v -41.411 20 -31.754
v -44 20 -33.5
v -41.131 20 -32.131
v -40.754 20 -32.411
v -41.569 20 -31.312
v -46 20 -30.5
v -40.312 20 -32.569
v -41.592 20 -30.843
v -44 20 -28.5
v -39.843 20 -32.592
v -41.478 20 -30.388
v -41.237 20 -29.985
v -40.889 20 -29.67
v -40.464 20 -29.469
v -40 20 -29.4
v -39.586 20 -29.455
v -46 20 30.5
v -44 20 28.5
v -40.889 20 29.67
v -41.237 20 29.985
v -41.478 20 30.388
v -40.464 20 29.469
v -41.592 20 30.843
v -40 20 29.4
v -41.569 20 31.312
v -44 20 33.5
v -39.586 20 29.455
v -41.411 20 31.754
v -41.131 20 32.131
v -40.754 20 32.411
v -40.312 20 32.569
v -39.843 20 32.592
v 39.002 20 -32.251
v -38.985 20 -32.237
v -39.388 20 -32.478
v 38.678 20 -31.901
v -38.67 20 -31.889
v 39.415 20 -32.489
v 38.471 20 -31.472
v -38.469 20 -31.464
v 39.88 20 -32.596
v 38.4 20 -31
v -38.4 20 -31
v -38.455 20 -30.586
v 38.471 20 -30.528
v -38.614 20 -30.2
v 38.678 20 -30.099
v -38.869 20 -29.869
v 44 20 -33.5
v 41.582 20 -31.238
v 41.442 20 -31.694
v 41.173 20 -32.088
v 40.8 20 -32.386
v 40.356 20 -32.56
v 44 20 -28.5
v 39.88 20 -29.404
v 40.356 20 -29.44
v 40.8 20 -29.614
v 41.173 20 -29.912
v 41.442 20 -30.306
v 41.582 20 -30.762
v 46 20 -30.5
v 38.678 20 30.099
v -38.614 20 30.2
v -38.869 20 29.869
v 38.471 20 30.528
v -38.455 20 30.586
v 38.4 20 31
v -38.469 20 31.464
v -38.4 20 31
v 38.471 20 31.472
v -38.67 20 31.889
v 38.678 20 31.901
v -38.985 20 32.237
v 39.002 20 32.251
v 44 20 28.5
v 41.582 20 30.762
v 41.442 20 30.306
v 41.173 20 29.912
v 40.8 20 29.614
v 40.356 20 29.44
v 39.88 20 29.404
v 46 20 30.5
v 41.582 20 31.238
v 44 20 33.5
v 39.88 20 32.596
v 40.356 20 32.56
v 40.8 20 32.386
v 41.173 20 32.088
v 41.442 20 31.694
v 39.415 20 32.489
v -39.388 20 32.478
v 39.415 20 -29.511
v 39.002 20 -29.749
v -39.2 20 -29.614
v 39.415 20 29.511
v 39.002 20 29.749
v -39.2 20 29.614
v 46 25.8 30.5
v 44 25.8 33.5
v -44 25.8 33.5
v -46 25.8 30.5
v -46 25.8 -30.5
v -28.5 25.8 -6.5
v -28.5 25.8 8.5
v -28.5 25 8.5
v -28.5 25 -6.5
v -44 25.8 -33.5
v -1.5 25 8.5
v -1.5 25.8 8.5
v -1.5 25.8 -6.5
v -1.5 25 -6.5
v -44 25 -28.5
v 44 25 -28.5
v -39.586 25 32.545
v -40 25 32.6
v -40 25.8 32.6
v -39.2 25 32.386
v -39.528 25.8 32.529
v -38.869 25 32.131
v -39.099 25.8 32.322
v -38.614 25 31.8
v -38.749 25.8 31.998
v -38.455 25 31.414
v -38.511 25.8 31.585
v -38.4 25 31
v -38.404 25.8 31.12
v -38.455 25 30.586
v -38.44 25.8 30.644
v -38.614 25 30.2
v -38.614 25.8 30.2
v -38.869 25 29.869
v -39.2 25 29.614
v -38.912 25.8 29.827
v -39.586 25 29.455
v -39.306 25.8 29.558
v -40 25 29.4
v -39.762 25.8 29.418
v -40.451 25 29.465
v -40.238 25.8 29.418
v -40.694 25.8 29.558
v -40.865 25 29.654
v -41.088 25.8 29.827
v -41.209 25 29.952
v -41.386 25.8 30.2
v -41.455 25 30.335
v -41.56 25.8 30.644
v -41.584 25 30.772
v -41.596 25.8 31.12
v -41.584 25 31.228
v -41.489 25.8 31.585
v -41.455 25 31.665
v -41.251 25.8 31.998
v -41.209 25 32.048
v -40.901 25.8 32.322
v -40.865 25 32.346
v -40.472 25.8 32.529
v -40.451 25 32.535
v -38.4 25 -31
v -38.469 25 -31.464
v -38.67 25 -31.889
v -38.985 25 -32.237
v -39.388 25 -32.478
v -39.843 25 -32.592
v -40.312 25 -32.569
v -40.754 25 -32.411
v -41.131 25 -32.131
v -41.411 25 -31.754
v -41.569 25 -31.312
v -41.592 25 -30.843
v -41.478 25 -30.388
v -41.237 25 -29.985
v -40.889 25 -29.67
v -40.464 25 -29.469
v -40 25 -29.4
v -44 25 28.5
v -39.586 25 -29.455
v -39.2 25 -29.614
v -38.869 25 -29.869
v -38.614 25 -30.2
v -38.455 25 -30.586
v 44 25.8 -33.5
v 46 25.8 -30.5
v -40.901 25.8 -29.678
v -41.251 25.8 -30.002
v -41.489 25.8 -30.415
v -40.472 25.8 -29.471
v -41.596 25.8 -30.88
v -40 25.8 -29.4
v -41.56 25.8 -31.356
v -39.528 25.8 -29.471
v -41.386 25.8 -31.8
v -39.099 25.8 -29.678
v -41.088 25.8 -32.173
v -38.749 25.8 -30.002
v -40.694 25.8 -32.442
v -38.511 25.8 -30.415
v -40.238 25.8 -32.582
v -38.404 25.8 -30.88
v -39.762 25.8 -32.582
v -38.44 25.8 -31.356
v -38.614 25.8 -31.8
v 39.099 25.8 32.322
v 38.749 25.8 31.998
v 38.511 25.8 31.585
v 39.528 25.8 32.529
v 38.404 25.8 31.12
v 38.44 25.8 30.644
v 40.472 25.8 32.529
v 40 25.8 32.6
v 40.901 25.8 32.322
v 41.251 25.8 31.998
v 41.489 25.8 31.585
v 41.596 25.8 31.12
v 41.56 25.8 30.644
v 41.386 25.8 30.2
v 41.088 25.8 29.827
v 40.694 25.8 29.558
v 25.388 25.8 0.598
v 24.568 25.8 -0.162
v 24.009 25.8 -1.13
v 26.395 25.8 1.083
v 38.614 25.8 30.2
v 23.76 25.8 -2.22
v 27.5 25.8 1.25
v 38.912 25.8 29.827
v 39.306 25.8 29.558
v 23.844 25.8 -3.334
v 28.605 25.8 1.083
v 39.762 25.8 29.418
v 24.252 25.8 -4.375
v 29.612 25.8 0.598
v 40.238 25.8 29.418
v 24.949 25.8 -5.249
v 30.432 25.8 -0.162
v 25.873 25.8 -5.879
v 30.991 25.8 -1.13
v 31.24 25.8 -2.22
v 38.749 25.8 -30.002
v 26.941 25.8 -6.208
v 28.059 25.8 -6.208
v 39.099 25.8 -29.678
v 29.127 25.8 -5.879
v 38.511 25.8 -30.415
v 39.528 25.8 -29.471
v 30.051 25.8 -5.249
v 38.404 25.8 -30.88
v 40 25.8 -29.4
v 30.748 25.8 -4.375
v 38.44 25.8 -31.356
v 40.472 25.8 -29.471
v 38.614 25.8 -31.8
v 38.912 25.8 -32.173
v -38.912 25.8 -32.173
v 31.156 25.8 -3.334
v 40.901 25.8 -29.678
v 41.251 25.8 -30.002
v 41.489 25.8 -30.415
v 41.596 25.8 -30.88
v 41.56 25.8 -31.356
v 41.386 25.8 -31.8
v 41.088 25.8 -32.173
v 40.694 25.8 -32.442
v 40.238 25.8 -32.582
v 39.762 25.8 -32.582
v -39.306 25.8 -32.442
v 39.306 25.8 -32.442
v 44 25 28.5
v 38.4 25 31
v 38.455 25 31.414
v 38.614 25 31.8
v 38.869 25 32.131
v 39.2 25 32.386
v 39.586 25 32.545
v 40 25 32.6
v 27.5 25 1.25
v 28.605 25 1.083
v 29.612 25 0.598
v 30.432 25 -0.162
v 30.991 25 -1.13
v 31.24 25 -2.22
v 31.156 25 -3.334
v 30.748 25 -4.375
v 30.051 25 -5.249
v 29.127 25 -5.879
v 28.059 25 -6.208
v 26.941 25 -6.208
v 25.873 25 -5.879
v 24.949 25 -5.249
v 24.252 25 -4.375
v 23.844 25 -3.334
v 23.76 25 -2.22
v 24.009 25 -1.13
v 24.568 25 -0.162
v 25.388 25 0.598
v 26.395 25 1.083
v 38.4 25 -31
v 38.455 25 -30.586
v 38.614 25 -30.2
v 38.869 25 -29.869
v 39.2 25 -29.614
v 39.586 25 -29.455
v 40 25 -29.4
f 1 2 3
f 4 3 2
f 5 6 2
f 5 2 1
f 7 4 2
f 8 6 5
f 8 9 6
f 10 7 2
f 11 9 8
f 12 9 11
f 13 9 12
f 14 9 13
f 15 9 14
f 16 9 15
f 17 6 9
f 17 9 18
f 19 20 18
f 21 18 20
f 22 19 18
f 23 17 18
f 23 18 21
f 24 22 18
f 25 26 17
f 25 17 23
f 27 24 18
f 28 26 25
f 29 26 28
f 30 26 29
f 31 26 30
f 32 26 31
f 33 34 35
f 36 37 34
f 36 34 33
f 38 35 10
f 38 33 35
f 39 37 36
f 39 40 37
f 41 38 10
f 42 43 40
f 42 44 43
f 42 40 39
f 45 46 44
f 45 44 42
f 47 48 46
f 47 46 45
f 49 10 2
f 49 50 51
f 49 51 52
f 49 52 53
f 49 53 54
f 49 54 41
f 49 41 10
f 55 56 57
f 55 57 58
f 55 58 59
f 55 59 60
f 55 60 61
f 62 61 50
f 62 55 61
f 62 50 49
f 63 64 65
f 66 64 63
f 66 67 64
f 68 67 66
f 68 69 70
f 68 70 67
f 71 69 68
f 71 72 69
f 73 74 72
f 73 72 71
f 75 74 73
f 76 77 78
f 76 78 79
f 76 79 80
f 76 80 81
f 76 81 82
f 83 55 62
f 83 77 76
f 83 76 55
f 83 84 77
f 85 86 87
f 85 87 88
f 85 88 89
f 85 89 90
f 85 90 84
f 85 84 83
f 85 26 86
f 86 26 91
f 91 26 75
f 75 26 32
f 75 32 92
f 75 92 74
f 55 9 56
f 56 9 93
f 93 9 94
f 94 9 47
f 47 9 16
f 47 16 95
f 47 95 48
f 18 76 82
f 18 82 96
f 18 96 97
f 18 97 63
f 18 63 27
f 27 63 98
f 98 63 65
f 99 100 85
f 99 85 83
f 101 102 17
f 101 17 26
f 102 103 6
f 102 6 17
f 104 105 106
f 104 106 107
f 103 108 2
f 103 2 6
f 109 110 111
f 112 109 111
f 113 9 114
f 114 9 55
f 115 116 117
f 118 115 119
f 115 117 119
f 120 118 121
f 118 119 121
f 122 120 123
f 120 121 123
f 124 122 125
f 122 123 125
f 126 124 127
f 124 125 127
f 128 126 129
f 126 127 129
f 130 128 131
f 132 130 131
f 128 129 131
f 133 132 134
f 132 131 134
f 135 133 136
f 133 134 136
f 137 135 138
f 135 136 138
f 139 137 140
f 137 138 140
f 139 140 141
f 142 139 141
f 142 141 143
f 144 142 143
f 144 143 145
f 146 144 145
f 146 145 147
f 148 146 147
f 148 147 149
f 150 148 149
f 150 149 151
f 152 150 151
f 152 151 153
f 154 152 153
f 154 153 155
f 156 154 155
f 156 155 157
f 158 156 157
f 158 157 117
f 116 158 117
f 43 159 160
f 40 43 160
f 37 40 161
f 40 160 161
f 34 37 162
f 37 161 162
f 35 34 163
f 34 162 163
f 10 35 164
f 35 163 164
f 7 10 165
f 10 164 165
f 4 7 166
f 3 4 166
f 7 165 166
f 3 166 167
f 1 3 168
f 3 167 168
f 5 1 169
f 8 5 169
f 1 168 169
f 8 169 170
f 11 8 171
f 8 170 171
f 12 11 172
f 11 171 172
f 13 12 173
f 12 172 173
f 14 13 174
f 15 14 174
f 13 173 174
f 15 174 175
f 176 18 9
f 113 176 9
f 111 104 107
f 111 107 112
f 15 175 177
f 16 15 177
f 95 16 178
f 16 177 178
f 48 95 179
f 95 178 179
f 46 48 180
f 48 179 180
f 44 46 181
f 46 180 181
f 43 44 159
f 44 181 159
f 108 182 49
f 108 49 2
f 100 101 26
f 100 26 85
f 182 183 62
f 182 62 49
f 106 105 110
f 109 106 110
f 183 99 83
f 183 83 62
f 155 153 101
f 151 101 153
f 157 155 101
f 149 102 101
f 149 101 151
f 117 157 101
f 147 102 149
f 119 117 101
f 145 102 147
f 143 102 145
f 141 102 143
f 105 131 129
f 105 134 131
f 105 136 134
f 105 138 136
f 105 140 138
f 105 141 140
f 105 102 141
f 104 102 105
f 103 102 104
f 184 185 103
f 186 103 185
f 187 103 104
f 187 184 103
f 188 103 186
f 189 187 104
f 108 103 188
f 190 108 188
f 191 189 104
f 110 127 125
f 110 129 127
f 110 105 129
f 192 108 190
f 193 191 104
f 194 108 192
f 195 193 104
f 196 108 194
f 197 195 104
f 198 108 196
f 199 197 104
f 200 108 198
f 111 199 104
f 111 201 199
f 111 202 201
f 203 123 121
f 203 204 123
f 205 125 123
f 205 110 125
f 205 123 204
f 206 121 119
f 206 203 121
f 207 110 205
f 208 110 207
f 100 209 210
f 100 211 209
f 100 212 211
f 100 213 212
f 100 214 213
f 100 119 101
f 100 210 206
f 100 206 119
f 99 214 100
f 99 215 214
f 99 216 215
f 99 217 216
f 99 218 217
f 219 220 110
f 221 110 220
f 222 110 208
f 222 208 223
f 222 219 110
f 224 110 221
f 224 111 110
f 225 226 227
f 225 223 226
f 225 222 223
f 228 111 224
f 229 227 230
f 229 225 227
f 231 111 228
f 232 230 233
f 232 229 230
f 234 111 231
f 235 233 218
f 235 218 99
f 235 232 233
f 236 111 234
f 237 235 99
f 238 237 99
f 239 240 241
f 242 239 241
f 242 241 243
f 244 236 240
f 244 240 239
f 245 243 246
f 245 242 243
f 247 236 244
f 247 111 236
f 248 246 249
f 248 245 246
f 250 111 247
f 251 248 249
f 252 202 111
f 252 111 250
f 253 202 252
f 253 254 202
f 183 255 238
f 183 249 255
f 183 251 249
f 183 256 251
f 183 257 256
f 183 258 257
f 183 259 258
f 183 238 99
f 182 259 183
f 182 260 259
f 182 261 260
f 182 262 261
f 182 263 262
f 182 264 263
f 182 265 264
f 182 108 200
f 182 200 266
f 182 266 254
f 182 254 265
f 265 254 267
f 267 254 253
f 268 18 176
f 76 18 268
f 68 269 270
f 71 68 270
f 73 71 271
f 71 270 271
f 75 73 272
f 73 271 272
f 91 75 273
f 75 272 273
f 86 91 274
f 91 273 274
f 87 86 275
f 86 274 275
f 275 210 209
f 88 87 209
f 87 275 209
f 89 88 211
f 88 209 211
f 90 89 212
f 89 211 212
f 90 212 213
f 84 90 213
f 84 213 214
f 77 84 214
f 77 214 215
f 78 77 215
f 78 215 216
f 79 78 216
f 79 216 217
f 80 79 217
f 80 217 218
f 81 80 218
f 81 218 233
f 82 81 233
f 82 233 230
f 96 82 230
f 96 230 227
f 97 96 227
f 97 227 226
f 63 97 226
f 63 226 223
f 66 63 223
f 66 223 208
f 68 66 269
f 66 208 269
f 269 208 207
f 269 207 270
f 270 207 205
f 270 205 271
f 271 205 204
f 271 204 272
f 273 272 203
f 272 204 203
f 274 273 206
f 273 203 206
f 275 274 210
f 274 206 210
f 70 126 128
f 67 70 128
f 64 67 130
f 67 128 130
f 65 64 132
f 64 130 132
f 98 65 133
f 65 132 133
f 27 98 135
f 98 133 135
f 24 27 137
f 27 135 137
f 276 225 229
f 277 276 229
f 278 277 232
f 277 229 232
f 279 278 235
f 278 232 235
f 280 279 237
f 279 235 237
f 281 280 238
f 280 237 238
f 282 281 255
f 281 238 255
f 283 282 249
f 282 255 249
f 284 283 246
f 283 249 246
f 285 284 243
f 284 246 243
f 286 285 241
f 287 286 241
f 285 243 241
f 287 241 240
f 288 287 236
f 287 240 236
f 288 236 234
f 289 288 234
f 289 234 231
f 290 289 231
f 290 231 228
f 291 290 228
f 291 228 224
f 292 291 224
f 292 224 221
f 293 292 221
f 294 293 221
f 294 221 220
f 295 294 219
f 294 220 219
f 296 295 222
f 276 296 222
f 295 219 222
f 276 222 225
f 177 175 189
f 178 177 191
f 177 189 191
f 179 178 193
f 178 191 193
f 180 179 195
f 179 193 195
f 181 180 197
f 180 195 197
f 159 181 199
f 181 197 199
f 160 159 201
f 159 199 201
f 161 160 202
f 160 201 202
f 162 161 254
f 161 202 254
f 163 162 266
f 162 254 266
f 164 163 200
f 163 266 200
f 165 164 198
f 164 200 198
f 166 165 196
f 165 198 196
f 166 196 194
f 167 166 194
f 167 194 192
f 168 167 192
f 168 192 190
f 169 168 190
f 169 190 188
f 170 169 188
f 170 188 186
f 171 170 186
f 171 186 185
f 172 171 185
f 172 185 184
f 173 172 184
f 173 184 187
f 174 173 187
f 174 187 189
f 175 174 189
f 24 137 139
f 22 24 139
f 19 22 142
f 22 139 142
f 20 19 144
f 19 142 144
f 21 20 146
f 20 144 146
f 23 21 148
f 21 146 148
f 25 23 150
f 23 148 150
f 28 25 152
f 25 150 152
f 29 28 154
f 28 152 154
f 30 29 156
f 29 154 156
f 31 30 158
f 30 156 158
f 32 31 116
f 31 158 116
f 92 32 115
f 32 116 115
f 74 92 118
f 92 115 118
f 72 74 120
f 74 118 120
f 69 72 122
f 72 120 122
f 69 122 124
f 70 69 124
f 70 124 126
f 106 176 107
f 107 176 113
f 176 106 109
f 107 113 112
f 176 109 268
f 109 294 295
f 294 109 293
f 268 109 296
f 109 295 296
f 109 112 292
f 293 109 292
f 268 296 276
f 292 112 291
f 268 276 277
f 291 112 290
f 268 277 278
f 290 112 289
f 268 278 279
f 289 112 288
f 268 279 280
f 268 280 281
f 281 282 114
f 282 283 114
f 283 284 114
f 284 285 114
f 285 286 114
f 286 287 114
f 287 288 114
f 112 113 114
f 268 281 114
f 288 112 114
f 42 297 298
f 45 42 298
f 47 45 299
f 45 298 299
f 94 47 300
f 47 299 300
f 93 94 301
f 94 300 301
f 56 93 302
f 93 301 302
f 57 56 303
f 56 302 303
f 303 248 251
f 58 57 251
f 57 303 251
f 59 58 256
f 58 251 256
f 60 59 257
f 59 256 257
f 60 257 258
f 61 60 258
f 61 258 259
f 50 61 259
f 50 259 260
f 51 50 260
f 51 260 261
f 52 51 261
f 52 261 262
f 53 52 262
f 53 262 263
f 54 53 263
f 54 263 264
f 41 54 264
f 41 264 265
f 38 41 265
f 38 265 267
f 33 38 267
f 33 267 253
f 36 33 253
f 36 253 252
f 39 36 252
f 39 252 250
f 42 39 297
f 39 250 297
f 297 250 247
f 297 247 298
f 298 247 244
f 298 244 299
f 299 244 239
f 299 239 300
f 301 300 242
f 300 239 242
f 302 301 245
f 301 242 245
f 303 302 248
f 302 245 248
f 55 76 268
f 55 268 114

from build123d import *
from OCP.BRepFilletAPI import BRepFilletAPI_MakeChamfer

# Parameters (mm, degrees)
SKETCH1_W           = 92
SKETCH1_H           = 67
SKETCH1_W_2         = 88
SKETCH1_H_2         = 57
BOSS_EXTRUDE1_DEPTH = 25
SKETCH2_W           = 92
SKETCH2_H           = 67
BOSS_EXTRUDE2_DEPTH = 0.8
CUT_EXTRUDE1_REACH  = 103.051
SKETCH3_W           = 11
SKETCH3_H           = 7
CUT_EXTRUDE2_DEPTH  = 8
CHAMFER1_SIZE       = 3
CHAMFER1_SIZE2      = 2
CHAMFER2_SIZE       = 2
CHAMFER2_SIZE2      = 3
BOSS_EXTRUDE3_START = 0.8
SKETCH6_R           = 1.6
SKETCH6_W           = 88
SKETCH6_H           = 57
SKETCH6_R_2         = 3.75
SKETCH6_W_2         = 27
SKETCH6_H_2         = 15
BOSS_EXTRUDE3_DEPTH = 0.8
CUT_EXTRUDE3_DEPTH  = 20.8


with BuildPart() as part:
    # Sketch1 → Boss-Extrude1 (new body)
    with BuildSketch(Plane(origin=(0, 0, 0), x_dir=(1, 0, 0), z_dir=(0, 1, 0))):
        Rectangle(SKETCH1_W, SKETCH1_H)
        Rectangle(SKETCH1_W_2, SKETCH1_H_2, mode=Mode.SUBTRACT)
    extrude(amount=BOSS_EXTRUDE1_DEPTH)

    # Sketch2 → Boss-Extrude2 (add)
    with BuildSketch(Plane.XZ):
        Rectangle(SKETCH2_W, SKETCH2_H)
    extrude(amount=BOSS_EXTRUDE2_DEPTH)

    # Sketch3 → Cut-Extrude1 (cut, up to next)
    with BuildSketch(Plane.ZY.offset(46), mode=Mode.PRIVATE) as cut_extrude1_sk1:
        with Locations((0, 15)):
            Rectangle(SKETCH3_W, SKETCH3_H)
    cut_extrude1_tool1 = extrude(cut_extrude1_sk1.sketch, amount=-CUT_EXTRUDE1_REACH, mode=Mode.PRIVATE) & part.part
    add(cut_extrude1_tool1.solids().sort_by_distance((-46, 15, 0))[0], mode=Mode.SUBTRACT)

    # Sketch4 → Cut-Extrude2 (cut)
    with BuildSketch(Plane(origin=(0, 25, 0), x_dir=(1, 0, 0), z_dir=(0, 1, 0))):
        with BuildLine():
            ThreePointArc((-38.4, 31), (-41.13137085, 32.13137085), (-40, 29.4))
            Line((-40, 29.4), (-40, 31))
            Line((-40, 31), (-38.4, 31))
        make_face()
        with BuildLine():
            Line((-40, 31), (-40, 29.4))
            ThreePointArc((-40, 29.4), (-38.86862915, 29.86862915), (-38.4, 31))
            Line((-38.4, 31), (-40, 31))
        make_face()
        with BuildLine():
            ThreePointArc((-40, -29.4), (-41.13137085, -32.13137085), (-38.4, -31))
            Line((-38.4, -31), (-40, -31))
            Line((-40, -31), (-40, -29.4))
        make_face()
        with BuildLine():
            Line((-40, -31), (-38.4, -31))
            ThreePointArc((-38.4, -31), (-38.86862915, -29.86862915), (-40, -29.4))
            Line((-40, -29.4), (-40, -31))
        make_face()
        with BuildLine():
            ThreePointArc((40, -29.4), (38.86862915, -29.86862915), (38.4, -31))
            Line((38.4, -31), (40, -31))
            Line((40, -31), (40, -29.4))
        make_face()
        with BuildLine():
            Line((40, -31), (38.4, -31))
            ThreePointArc((38.4, -31), (40, -32.6), (41.6, -31))
            ThreePointArc((41.6, -31), (41.13137085, -29.86862915), (40, -29.4))
            Line((40, -29.4), (40, -31))
        make_face()
        with BuildLine():
            ThreePointArc((38.4, 31), (38.86862915, 29.86862915), (40, 29.4))
            Line((40, 29.4), (40, 31))
            Line((40, 31), (38.4, 31))
        make_face()
        with BuildLine():
            Line((40, 31), (40, 29.4))
            ThreePointArc((40, 29.4), (41.13137085, 29.86862915), (41.6, 31))
            ThreePointArc((41.6, 31), (40, 32.6), (38.4, 31))
            Line((38.4, 31), (40, 31))
        make_face()
    extrude(amount=-CUT_EXTRUDE2_DEPTH, mode=Mode.SUBTRACT)

    # Chamfer1: one chamfer whose edges measure the first distance from different faces: ONE call of the kernel's chamfer builder (chamfer() names one face for all edges)
    chamfer1_edges_1 = [part.edges().sort_by_distance(p)[0] for p in [
        (46, 12.1, -33.5),
    ]]
    chamfer1_side_1 = [part.faces().sort_by_distance(p)[0] for p in [
        (46, 12.1, 0),
    ]]
    chamfer1_edges_2 = [part.edges().sort_by_distance(p)[0] for p in [
        (-46, 12.1, 33.5),
    ]]
    chamfer1_side_2 = [part.faces().sort_by_distance(p)[0] for p in [
        (-46, 12.1, 32.782041784),
    ]]
    chamfer1 = BRepFilletAPI_MakeChamfer(part.part.solid().wrapped)
    for e in chamfer1_edges_1:
        chamfer1.Add(CHAMFER1_SIZE, CHAMFER1_SIZE2, e.wrapped, chamfer1_side_1[0].wrapped)  # the first distance lies on this face
    for e in chamfer1_edges_2:
        chamfer1.Add(CHAMFER1_SIZE, CHAMFER1_SIZE2, e.wrapped, chamfer1_side_2[0].wrapped)  # the first distance lies on this face
    add(Compound.cast(chamfer1.Shape()), mode=Mode.REPLACE)

    # Chamfer2: one chamfer whose edges measure the first distance from different faces: ONE call of the kernel's chamfer builder (chamfer() names one face for all edges)
    chamfer2_edges_1 = [part.edges().sort_by_distance(p)[0] for p in [
        (-46, 12.1, -33.5),
    ]]
    chamfer2_side_1 = [part.faces().sort_by_distance(p)[0] for p in [
        (-1, 12.1, -33.5),
    ]]
    chamfer2_edges_2 = [part.edges().sort_by_distance(p)[0] for p in [
        (46, 12.1, 33.5),
    ]]
    chamfer2_side_2 = [part.faces().sort_by_distance(p)[0] for p in [
        (1, 12.1, 33.5),
    ]]
    chamfer2 = BRepFilletAPI_MakeChamfer(part.part.solid().wrapped)
    for e in chamfer2_edges_1:
        chamfer2.Add(CHAMFER2_SIZE, CHAMFER2_SIZE2, e.wrapped, chamfer2_side_1[0].wrapped)  # the first distance lies on this face
    for e in chamfer2_edges_2:
        chamfer2.Add(CHAMFER2_SIZE, CHAMFER2_SIZE2, e.wrapped, chamfer2_side_2[0].wrapped)  # the first distance lies on this face
    add(Compound.cast(chamfer2.Shape()), mode=Mode.REPLACE)

    # Sketch6 → Boss-Extrude3 (add)
    # profile 1 of 2: a face of its own
    with BuildSketch(Plane(origin=(0, 25, 0), x_dir=(1, 0, 0), z_dir=(0, 1, 0)).offset(BOSS_EXTRUDE3_START)):
        Polygon((46, 30.5), (44, 33.5), (-44, 33.5), (-46, 30.5), (-46, -30.5), (-44, -33.5), (44, -33.5), (46, -30.5), align=None)
        with Locations(Location((40, -31, 0), (0, 0, 270))):
            Circle(SKETCH6_R, mode=Mode.SUBTRACT)
        with Locations(Location((-40, 31, 0), (0, 0, 270))):
            Circle(SKETCH6_R, mode=Mode.SUBTRACT)
        with Locations(Location((-40, -31, 0), (0, 0, 270))):
            Circle(SKETCH6_R, mode=Mode.SUBTRACT)
        with Locations(Location((40, 31, 0), (0, 0, 270))):
            Circle(SKETCH6_R, mode=Mode.SUBTRACT)
        Rectangle(SKETCH6_W, SKETCH6_H, mode=Mode.SUBTRACT)
    # profile 2 of 2: a face of its own
    with BuildSketch(Plane(origin=(0, 25, 0), x_dir=(1, 0, 0), z_dir=(0, 1, 0)).offset(BOSS_EXTRUDE3_START)):
        Rectangle(SKETCH6_W, SKETCH6_H)
        with Locations(Location((27.5, 2.5, 0), (0, 0, 270))):
            Circle(SKETCH6_R_2, mode=Mode.SUBTRACT)
        with Locations((-15, -1)):
            Rectangle(SKETCH6_W_2, SKETCH6_H_2, mode=Mode.SUBTRACT)
    extrude(amount=-BOSS_EXTRUDE3_DEPTH)

    # Sketch7 → Cut-Extrude3 (cut)
    with BuildSketch(Plane.XZ.offset(0.8)):
        Polygon((-46, 30.5), (-46, -30.5), (-44, -33.5), (44, -33.5), (46, -30.5), (46, 30.5), (44, 33.5), (-44, 33.5), align=None)
    extrude(amount=-CUT_EXTRUDE3_DEPTH, mode=Mode.SUBTRACT)


solid = part.part
